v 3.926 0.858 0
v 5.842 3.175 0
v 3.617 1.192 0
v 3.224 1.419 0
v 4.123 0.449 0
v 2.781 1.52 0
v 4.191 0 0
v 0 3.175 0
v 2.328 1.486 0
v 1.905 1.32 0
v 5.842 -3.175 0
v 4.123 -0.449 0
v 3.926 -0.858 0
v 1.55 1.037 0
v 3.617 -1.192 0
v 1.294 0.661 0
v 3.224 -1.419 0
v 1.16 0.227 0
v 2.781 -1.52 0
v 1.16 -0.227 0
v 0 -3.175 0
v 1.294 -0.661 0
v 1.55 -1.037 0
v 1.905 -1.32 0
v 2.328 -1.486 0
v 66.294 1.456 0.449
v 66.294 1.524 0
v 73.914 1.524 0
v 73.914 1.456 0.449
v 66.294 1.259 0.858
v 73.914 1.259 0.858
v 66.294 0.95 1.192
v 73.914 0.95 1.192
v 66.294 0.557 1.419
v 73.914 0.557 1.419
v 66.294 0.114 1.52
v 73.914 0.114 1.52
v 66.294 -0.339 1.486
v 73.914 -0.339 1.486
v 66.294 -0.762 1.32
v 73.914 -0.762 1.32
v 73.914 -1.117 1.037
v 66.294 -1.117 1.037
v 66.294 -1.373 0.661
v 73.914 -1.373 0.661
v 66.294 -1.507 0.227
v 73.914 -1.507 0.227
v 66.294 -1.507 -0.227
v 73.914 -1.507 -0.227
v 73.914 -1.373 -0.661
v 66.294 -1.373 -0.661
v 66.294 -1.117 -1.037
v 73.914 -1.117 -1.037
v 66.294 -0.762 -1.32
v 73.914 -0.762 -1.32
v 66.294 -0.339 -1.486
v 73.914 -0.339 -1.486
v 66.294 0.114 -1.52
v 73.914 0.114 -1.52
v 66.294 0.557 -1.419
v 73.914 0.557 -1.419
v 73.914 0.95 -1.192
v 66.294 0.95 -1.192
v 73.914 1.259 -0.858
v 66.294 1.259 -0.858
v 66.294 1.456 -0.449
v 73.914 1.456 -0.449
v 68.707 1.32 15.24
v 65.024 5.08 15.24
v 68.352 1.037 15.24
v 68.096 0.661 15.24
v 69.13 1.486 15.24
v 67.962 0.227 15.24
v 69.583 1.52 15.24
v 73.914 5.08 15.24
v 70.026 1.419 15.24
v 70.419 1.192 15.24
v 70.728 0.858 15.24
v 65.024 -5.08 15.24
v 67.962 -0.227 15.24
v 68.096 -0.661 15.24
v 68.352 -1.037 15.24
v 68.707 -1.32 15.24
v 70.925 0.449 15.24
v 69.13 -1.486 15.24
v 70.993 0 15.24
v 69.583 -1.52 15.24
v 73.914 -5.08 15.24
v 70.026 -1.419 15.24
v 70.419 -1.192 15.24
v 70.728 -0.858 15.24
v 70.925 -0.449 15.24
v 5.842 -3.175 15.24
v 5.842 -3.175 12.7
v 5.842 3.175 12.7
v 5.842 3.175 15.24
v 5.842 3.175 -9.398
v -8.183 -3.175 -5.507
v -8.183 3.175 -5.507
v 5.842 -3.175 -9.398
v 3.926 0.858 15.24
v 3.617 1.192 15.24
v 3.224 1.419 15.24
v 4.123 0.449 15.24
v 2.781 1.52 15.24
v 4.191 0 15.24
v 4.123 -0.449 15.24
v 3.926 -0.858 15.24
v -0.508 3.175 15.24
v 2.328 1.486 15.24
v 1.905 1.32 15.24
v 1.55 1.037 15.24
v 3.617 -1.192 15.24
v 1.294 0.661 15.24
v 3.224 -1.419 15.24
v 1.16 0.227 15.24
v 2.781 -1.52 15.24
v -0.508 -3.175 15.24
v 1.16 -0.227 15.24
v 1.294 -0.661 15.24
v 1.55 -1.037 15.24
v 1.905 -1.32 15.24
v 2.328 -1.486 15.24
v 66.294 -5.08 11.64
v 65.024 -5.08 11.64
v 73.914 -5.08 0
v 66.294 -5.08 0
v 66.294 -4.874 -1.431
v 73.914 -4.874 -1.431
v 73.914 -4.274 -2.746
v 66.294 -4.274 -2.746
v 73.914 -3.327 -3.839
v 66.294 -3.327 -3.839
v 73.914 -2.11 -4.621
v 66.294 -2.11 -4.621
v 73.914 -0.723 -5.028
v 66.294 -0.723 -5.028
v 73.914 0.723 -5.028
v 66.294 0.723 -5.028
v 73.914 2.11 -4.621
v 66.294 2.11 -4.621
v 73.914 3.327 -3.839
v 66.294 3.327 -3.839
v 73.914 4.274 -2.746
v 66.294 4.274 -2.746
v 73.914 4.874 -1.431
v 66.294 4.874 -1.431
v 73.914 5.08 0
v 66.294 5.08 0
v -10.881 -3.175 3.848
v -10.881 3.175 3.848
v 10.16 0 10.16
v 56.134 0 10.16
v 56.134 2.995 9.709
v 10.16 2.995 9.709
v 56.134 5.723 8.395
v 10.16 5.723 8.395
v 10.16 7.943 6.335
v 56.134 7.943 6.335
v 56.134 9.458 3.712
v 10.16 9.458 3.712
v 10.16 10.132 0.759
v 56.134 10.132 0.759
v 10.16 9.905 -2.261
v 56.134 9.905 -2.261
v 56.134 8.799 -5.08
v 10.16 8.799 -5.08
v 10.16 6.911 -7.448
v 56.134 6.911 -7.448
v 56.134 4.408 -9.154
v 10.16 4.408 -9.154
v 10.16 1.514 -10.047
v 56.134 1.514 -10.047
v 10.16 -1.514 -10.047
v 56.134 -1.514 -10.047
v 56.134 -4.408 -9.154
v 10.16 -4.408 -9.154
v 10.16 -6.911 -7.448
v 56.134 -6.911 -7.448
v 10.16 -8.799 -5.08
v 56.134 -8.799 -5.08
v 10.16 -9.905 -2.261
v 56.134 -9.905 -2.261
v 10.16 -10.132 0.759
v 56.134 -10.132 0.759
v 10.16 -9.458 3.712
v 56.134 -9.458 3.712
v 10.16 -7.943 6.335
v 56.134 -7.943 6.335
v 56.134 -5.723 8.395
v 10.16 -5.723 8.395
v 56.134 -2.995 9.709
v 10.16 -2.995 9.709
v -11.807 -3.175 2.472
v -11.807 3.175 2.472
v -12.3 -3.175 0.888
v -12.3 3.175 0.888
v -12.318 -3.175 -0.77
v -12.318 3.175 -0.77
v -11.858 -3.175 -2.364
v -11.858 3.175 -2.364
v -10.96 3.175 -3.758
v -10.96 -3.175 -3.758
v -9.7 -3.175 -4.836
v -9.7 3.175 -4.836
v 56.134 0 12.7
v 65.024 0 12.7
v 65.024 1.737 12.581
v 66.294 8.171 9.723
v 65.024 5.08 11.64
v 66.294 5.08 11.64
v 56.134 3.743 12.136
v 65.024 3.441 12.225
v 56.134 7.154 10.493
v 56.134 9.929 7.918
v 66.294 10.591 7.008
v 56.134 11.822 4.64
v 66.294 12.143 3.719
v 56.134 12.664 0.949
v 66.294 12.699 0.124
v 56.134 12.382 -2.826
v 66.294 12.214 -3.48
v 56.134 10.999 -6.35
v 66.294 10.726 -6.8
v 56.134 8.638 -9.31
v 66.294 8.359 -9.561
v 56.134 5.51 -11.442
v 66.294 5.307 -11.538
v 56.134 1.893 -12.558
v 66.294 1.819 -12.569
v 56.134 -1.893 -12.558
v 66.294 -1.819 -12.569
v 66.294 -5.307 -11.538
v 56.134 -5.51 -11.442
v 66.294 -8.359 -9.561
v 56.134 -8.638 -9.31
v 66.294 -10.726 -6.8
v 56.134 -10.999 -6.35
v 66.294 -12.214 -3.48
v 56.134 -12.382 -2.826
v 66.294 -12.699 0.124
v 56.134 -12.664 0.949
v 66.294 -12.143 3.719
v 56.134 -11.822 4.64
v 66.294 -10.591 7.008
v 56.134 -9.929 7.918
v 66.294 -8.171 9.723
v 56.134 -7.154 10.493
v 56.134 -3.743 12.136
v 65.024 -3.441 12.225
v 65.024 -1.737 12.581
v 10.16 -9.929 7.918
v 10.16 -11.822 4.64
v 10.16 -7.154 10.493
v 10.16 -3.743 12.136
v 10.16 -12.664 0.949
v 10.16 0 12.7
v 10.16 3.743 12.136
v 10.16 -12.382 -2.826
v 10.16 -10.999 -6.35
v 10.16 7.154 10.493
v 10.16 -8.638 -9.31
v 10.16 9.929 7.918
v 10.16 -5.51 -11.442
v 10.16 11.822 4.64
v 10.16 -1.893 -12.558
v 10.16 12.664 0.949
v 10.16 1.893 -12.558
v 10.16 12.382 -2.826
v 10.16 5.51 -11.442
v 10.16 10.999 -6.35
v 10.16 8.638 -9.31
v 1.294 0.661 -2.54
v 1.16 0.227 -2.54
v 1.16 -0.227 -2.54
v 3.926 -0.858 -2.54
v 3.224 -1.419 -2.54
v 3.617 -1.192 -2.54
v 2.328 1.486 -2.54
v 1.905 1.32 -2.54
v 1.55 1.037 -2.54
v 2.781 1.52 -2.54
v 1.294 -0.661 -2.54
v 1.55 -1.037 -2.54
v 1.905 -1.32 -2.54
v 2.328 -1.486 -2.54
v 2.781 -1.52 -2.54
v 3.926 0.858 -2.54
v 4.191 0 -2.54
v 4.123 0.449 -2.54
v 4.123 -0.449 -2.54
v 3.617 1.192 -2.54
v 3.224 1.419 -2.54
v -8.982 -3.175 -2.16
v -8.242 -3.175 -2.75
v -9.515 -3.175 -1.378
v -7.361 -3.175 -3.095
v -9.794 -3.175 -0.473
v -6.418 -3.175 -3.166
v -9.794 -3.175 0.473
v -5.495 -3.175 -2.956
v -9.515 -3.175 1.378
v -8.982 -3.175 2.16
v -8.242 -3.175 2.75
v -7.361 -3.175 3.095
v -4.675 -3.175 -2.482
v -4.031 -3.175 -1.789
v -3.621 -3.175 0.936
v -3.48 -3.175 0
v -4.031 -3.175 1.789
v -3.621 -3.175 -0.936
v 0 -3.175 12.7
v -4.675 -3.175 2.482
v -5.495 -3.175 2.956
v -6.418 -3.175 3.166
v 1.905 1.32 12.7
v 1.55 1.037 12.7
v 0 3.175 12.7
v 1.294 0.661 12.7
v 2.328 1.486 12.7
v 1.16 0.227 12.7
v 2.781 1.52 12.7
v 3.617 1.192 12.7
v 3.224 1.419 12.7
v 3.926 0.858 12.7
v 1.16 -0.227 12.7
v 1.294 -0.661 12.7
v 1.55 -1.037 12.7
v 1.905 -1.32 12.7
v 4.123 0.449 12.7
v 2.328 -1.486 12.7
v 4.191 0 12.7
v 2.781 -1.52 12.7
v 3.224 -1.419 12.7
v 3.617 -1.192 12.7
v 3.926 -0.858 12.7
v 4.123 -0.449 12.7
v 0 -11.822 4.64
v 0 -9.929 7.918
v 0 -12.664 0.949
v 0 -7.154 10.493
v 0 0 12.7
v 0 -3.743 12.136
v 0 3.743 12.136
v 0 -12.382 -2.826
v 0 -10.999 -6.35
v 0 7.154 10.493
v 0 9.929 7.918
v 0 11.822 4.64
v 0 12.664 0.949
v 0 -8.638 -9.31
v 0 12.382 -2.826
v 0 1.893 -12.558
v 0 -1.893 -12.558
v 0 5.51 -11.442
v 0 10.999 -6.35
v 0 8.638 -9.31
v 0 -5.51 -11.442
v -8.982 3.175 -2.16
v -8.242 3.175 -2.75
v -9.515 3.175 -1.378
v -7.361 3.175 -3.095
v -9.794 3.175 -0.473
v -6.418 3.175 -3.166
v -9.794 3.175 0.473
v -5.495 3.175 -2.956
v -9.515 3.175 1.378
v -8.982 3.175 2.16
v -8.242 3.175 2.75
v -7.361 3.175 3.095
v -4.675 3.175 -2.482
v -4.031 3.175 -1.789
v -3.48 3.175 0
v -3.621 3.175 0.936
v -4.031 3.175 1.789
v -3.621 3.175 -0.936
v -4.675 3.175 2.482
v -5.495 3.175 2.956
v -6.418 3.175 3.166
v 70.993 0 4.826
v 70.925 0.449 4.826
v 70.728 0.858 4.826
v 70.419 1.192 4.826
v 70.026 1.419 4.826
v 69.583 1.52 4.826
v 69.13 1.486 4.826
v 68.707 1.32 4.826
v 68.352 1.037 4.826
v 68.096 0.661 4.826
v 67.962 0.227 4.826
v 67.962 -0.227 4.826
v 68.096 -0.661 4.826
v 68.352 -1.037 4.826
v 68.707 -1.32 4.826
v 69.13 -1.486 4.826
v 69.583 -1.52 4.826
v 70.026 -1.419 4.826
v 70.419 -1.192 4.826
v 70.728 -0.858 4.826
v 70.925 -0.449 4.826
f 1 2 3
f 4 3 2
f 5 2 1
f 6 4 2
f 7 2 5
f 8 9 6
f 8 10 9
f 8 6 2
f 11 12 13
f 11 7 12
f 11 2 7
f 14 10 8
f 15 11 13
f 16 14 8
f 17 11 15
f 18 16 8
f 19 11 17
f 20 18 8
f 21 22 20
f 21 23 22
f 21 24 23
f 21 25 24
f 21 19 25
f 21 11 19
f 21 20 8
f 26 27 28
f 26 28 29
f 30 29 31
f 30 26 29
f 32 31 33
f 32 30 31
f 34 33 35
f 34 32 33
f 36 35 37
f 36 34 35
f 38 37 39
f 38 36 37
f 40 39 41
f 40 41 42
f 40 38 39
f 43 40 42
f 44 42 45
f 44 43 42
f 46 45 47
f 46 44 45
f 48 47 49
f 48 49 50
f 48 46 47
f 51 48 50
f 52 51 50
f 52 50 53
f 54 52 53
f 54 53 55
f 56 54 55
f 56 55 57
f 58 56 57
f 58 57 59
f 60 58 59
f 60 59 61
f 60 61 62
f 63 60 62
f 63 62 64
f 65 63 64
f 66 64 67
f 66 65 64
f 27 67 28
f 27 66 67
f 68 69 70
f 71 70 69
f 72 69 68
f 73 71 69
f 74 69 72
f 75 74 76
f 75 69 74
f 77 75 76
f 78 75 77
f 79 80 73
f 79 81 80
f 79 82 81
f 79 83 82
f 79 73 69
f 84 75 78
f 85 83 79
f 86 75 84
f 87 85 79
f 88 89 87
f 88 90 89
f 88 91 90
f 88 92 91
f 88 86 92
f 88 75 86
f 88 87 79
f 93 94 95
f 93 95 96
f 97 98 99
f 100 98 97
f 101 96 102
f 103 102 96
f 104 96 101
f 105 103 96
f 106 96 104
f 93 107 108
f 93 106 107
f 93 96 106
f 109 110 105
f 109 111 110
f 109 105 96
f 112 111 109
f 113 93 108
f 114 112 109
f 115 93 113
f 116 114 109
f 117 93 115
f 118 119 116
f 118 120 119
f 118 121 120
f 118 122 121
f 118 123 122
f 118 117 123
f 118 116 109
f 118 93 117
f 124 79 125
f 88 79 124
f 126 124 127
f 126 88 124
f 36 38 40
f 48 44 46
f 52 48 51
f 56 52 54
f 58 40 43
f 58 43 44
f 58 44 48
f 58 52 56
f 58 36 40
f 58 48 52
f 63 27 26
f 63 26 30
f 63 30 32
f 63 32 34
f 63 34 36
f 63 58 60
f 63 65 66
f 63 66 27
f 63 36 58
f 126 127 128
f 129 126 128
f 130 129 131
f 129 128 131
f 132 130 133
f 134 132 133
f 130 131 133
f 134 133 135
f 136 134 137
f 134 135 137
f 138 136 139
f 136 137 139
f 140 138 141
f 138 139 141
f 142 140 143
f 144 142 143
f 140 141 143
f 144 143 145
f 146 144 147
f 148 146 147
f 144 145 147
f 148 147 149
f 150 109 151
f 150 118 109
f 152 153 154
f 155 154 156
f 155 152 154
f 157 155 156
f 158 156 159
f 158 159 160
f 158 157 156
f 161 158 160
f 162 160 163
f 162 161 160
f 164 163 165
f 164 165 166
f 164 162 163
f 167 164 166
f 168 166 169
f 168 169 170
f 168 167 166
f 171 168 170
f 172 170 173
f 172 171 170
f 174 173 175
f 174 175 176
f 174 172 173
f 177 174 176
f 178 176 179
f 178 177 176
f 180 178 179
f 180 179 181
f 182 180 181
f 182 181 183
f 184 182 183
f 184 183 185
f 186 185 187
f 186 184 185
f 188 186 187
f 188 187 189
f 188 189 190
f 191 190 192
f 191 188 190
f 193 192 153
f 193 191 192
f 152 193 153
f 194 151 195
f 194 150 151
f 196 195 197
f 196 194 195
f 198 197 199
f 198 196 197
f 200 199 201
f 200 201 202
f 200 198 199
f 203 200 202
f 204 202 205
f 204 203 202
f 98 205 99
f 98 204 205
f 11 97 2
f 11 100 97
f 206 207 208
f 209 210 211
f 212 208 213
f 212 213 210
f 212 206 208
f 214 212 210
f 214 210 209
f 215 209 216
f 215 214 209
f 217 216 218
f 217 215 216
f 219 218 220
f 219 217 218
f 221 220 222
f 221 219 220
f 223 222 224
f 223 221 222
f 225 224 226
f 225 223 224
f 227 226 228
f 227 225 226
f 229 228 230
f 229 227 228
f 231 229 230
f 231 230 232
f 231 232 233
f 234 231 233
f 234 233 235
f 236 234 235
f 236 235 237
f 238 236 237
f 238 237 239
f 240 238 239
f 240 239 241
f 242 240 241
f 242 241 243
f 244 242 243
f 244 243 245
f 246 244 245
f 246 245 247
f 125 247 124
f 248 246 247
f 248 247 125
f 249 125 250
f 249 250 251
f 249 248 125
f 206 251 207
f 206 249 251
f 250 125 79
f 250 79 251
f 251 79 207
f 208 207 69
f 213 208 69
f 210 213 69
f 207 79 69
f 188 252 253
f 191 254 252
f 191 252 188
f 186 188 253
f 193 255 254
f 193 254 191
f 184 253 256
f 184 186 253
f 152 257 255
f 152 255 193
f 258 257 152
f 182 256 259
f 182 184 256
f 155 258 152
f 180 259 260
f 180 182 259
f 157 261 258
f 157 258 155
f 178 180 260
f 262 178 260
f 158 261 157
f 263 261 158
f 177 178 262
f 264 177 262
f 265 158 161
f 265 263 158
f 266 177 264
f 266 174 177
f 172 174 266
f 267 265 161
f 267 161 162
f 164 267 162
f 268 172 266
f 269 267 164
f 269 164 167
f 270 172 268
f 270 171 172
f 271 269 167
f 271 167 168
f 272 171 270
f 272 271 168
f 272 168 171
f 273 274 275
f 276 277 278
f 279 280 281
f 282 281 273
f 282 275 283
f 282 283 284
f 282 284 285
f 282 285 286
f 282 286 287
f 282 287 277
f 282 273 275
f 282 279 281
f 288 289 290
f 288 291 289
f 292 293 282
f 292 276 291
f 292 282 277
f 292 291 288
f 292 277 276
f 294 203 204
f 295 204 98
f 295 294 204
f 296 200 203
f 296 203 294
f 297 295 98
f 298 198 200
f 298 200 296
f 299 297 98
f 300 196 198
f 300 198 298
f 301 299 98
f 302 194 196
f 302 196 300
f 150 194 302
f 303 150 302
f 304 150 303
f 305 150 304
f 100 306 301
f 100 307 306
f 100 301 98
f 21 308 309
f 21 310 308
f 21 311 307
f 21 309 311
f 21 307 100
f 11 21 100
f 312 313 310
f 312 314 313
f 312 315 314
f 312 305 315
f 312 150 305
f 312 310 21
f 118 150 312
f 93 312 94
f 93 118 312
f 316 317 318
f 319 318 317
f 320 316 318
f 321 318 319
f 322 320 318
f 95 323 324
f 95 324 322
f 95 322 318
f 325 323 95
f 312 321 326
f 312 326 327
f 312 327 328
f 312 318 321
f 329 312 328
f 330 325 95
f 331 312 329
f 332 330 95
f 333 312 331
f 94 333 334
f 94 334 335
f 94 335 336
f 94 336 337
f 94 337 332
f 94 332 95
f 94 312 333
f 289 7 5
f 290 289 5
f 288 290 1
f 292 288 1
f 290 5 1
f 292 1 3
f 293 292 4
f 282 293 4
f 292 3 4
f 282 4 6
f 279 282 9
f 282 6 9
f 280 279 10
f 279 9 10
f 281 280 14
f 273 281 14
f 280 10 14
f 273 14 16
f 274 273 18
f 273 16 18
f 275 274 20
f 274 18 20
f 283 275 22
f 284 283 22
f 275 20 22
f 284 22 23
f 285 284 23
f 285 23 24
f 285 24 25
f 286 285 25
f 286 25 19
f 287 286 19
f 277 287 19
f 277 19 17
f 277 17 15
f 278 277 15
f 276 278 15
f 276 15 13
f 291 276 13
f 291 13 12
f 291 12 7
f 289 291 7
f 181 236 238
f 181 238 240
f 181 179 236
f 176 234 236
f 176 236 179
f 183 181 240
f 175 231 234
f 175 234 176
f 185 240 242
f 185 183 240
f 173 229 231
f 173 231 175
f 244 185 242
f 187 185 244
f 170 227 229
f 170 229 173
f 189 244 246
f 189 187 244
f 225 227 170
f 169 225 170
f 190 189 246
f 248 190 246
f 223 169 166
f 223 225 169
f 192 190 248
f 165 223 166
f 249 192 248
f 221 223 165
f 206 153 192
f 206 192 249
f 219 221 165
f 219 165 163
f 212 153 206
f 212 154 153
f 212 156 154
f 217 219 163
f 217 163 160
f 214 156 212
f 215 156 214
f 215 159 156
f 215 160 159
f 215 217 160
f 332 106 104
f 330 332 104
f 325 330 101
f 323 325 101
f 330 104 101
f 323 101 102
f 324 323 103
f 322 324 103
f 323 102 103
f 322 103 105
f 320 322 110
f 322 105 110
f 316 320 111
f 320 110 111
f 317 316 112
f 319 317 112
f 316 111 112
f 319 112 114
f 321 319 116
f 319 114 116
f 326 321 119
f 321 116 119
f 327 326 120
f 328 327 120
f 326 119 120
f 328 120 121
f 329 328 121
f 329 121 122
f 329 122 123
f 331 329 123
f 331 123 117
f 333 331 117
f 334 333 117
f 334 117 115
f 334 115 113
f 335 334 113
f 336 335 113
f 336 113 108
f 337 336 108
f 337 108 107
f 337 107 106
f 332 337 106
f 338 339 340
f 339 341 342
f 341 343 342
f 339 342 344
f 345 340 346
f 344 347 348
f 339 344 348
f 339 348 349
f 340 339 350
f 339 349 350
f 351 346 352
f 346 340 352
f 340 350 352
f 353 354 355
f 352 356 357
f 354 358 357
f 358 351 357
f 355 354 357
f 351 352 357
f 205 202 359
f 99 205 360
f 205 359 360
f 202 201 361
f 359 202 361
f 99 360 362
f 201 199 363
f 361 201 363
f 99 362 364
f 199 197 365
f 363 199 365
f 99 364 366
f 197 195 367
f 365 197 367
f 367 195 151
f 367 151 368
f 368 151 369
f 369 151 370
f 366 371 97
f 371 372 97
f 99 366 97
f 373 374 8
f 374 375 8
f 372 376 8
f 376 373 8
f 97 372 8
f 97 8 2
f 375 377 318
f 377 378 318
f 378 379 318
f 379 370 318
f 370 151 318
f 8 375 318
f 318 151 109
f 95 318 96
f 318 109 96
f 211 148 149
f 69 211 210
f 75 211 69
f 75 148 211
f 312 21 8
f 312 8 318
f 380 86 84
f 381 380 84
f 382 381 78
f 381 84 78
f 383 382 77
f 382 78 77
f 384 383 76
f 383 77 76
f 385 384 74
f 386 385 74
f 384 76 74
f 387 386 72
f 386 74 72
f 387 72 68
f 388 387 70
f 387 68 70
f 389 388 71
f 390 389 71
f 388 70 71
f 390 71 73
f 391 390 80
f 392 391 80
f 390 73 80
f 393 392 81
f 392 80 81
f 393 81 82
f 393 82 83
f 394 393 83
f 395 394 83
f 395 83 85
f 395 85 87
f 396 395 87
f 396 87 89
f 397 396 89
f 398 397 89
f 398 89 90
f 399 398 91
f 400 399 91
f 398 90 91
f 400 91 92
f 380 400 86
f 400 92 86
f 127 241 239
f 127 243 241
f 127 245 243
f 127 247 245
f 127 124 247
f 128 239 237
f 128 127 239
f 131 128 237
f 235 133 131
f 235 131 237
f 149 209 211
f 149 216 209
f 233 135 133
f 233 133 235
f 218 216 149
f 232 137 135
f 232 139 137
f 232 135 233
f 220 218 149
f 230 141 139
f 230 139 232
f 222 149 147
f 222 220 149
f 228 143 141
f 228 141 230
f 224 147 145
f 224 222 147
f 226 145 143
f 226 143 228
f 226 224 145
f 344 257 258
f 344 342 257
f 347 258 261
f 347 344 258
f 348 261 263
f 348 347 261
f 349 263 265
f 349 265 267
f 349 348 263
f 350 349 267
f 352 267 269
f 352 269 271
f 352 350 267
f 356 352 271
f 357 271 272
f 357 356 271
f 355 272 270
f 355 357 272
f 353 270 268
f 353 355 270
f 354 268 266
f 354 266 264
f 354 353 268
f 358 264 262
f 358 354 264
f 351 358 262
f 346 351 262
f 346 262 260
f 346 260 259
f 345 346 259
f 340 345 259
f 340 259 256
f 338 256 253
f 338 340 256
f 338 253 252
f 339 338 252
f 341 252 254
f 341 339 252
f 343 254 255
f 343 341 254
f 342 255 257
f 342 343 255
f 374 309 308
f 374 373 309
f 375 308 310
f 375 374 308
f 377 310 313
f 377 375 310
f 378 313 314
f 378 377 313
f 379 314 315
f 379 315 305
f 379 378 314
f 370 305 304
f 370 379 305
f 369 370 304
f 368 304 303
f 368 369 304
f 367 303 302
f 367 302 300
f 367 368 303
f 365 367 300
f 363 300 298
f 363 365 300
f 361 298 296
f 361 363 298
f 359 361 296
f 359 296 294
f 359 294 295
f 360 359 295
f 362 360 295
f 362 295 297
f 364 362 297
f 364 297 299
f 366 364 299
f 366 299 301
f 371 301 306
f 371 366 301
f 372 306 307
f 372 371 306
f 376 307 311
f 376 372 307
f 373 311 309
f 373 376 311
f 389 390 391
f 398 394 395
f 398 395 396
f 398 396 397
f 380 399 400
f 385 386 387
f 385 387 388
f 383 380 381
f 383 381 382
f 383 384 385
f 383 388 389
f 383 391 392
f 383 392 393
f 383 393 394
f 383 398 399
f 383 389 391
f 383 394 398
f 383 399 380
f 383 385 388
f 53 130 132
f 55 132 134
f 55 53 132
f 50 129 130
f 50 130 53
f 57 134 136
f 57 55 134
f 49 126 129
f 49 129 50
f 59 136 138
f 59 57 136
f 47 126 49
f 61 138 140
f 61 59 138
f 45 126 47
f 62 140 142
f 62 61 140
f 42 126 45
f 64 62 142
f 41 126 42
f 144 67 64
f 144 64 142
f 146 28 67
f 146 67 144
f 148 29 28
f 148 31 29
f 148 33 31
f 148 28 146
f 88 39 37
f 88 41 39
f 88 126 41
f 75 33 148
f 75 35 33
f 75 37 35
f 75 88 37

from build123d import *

# Parameters (mm, degrees)
F0_W          = 5.842
F0_H          = 12.7
F0_R          = 3.175
F2_DEPTH      = 3.175
F3_R          = 1.524
F4_DEPTH      = 7.62
F4_DEPTH_BACK = 1.27
F5_R          = 1.524
F6_DEPTH      = 10.414
F7_R          = 1.524
F8_DEPTH      = 17.78


with BuildPart() as f1:
    # F0 (on Front) → F1 (revolve)
    with BuildSketch(Plane.XZ):
        Polygon((5.842, 12.7), (5.842, 0), (66.294, 0), (66.294, 12.7), (56.134, 12.7), (56.134, 10.16), (10.16, 10.16), (10.16, 12.7), align=None)
        with Locations((2.921, 6.35)):
            Rectangle(F0_W, F0_H)
    revolve(axis=Axis((33.147, 0, 0), (-1, 0, 0)))

    # F3 (on face) → F4 (join, two sides)
    with BuildSketch(Plane.YZ.offset(66.294)) as f4_sk:
        with BuildLine():
            ThreePointArc((-5.08, 0), (0, -5.08), (5.08, 0))
            ThreePointArc((5.08, 0), (0, 5.08), (-5.08, 0))
        make_face()
        Circle(F3_R, mode=Mode.SUBTRACT)
        with BuildLine():
            ThreePointArc((-5.08, 11.6397422652), (0, 12.7), (5.08, 11.6397422652))
            Line((5.08, 11.6397422652), (5.08, 15.24))
            Line((5.08, 15.24), (-5.08, 15.24))
            Line((-5.08, 15.24), (-5.08, 11.6397422652))
        make_face()
        with BuildLine():
            ThreePointArc((-5.08, 0), (0, 5.08), (5.08, 0))
            Line((5.08, 0), (5.08, 11.6397422652))
            ThreePointArc((5.08, 11.6397422652), (0, 12.7), (-5.08, 11.6397422652))
            Line((-5.08, 11.6397422652), (-5.08, 0))
        make_face()
    extrude(amount=F4_DEPTH)
    extrude(f4_sk.sketch, amount=-F4_DEPTH_BACK)

    # F5 (on face) → F6 (cut)
    with BuildSketch(Plane.XY.offset(15.24)):
        with Locations((69.469, 0)):
            Circle(F5_R)
    extrude(amount=-F6_DEPTH, mode=Mode.SUBTRACT)


with BuildPart() as f2:
    # F0 (on Front) → F2 (new body, symmetric)
    with BuildSketch(Plane.XZ):
        with BuildLine():
            Line((5.842, 0), (0, 0))
            Line((0, 0), (-0.9398, 0))
            ThreePointArc((-0.9398, 0), (-3.1957909266, -4.5493385486), (-8.1826630726, -5.5069827884))
            Line((-8.1826630726, -5.5069827884), (5.842, -9.398))
            Line((5.842, -9.398), (5.842, 0))
        make_face()
        with BuildLine():
            Line((-0.9398, 0), (0, 0))
            Line((0, 0), (0, 12.7))
            Line((0, 12.7), (5.842, 12.7))
            Line((5.842, 12.7), (5.842, 15.24))
            Line((5.842, 15.24), (-0.508, 15.24))
            Line((-0.508, 15.24), (-10.8806298187, 3.8475430269))
            ThreePointArc((-10.8806298187, 3.8475430269), (-4.5919612295, 5.3297205562), (-0.9398, 0))
        make_face()
        with BuildLine():
            ThreePointArc((-8.1826630726, -5.5069827884), (-3.1957909266, -4.5493385486), (-0.9398, 0))
            ThreePointArc((-0.9398, 0), (-4.5919612295, 5.3297205562), (-10.8806298187, 3.8475430269))
            ThreePointArc((-10.8806298187, 3.8475430269), (-12.1459778134, -1.5837270034), (-8.1826630726, -5.5069827884))
        make_face()
        with Locations((-6.6548, 0)):
            Circle(F0_R, mode=Mode.SUBTRACT)
    extrude(amount=F2_DEPTH, both=True)

    # F7 (on face) → F8 (cut)
    with BuildSketch(Plane.XY.offset(15.24)):
        with Locations((2.667, 0)):
            Circle(F7_R)
    extrude(amount=-F8_DEPTH, mode=Mode.SUBTRACT)


solid = Compound([f1.part, f2.part])
